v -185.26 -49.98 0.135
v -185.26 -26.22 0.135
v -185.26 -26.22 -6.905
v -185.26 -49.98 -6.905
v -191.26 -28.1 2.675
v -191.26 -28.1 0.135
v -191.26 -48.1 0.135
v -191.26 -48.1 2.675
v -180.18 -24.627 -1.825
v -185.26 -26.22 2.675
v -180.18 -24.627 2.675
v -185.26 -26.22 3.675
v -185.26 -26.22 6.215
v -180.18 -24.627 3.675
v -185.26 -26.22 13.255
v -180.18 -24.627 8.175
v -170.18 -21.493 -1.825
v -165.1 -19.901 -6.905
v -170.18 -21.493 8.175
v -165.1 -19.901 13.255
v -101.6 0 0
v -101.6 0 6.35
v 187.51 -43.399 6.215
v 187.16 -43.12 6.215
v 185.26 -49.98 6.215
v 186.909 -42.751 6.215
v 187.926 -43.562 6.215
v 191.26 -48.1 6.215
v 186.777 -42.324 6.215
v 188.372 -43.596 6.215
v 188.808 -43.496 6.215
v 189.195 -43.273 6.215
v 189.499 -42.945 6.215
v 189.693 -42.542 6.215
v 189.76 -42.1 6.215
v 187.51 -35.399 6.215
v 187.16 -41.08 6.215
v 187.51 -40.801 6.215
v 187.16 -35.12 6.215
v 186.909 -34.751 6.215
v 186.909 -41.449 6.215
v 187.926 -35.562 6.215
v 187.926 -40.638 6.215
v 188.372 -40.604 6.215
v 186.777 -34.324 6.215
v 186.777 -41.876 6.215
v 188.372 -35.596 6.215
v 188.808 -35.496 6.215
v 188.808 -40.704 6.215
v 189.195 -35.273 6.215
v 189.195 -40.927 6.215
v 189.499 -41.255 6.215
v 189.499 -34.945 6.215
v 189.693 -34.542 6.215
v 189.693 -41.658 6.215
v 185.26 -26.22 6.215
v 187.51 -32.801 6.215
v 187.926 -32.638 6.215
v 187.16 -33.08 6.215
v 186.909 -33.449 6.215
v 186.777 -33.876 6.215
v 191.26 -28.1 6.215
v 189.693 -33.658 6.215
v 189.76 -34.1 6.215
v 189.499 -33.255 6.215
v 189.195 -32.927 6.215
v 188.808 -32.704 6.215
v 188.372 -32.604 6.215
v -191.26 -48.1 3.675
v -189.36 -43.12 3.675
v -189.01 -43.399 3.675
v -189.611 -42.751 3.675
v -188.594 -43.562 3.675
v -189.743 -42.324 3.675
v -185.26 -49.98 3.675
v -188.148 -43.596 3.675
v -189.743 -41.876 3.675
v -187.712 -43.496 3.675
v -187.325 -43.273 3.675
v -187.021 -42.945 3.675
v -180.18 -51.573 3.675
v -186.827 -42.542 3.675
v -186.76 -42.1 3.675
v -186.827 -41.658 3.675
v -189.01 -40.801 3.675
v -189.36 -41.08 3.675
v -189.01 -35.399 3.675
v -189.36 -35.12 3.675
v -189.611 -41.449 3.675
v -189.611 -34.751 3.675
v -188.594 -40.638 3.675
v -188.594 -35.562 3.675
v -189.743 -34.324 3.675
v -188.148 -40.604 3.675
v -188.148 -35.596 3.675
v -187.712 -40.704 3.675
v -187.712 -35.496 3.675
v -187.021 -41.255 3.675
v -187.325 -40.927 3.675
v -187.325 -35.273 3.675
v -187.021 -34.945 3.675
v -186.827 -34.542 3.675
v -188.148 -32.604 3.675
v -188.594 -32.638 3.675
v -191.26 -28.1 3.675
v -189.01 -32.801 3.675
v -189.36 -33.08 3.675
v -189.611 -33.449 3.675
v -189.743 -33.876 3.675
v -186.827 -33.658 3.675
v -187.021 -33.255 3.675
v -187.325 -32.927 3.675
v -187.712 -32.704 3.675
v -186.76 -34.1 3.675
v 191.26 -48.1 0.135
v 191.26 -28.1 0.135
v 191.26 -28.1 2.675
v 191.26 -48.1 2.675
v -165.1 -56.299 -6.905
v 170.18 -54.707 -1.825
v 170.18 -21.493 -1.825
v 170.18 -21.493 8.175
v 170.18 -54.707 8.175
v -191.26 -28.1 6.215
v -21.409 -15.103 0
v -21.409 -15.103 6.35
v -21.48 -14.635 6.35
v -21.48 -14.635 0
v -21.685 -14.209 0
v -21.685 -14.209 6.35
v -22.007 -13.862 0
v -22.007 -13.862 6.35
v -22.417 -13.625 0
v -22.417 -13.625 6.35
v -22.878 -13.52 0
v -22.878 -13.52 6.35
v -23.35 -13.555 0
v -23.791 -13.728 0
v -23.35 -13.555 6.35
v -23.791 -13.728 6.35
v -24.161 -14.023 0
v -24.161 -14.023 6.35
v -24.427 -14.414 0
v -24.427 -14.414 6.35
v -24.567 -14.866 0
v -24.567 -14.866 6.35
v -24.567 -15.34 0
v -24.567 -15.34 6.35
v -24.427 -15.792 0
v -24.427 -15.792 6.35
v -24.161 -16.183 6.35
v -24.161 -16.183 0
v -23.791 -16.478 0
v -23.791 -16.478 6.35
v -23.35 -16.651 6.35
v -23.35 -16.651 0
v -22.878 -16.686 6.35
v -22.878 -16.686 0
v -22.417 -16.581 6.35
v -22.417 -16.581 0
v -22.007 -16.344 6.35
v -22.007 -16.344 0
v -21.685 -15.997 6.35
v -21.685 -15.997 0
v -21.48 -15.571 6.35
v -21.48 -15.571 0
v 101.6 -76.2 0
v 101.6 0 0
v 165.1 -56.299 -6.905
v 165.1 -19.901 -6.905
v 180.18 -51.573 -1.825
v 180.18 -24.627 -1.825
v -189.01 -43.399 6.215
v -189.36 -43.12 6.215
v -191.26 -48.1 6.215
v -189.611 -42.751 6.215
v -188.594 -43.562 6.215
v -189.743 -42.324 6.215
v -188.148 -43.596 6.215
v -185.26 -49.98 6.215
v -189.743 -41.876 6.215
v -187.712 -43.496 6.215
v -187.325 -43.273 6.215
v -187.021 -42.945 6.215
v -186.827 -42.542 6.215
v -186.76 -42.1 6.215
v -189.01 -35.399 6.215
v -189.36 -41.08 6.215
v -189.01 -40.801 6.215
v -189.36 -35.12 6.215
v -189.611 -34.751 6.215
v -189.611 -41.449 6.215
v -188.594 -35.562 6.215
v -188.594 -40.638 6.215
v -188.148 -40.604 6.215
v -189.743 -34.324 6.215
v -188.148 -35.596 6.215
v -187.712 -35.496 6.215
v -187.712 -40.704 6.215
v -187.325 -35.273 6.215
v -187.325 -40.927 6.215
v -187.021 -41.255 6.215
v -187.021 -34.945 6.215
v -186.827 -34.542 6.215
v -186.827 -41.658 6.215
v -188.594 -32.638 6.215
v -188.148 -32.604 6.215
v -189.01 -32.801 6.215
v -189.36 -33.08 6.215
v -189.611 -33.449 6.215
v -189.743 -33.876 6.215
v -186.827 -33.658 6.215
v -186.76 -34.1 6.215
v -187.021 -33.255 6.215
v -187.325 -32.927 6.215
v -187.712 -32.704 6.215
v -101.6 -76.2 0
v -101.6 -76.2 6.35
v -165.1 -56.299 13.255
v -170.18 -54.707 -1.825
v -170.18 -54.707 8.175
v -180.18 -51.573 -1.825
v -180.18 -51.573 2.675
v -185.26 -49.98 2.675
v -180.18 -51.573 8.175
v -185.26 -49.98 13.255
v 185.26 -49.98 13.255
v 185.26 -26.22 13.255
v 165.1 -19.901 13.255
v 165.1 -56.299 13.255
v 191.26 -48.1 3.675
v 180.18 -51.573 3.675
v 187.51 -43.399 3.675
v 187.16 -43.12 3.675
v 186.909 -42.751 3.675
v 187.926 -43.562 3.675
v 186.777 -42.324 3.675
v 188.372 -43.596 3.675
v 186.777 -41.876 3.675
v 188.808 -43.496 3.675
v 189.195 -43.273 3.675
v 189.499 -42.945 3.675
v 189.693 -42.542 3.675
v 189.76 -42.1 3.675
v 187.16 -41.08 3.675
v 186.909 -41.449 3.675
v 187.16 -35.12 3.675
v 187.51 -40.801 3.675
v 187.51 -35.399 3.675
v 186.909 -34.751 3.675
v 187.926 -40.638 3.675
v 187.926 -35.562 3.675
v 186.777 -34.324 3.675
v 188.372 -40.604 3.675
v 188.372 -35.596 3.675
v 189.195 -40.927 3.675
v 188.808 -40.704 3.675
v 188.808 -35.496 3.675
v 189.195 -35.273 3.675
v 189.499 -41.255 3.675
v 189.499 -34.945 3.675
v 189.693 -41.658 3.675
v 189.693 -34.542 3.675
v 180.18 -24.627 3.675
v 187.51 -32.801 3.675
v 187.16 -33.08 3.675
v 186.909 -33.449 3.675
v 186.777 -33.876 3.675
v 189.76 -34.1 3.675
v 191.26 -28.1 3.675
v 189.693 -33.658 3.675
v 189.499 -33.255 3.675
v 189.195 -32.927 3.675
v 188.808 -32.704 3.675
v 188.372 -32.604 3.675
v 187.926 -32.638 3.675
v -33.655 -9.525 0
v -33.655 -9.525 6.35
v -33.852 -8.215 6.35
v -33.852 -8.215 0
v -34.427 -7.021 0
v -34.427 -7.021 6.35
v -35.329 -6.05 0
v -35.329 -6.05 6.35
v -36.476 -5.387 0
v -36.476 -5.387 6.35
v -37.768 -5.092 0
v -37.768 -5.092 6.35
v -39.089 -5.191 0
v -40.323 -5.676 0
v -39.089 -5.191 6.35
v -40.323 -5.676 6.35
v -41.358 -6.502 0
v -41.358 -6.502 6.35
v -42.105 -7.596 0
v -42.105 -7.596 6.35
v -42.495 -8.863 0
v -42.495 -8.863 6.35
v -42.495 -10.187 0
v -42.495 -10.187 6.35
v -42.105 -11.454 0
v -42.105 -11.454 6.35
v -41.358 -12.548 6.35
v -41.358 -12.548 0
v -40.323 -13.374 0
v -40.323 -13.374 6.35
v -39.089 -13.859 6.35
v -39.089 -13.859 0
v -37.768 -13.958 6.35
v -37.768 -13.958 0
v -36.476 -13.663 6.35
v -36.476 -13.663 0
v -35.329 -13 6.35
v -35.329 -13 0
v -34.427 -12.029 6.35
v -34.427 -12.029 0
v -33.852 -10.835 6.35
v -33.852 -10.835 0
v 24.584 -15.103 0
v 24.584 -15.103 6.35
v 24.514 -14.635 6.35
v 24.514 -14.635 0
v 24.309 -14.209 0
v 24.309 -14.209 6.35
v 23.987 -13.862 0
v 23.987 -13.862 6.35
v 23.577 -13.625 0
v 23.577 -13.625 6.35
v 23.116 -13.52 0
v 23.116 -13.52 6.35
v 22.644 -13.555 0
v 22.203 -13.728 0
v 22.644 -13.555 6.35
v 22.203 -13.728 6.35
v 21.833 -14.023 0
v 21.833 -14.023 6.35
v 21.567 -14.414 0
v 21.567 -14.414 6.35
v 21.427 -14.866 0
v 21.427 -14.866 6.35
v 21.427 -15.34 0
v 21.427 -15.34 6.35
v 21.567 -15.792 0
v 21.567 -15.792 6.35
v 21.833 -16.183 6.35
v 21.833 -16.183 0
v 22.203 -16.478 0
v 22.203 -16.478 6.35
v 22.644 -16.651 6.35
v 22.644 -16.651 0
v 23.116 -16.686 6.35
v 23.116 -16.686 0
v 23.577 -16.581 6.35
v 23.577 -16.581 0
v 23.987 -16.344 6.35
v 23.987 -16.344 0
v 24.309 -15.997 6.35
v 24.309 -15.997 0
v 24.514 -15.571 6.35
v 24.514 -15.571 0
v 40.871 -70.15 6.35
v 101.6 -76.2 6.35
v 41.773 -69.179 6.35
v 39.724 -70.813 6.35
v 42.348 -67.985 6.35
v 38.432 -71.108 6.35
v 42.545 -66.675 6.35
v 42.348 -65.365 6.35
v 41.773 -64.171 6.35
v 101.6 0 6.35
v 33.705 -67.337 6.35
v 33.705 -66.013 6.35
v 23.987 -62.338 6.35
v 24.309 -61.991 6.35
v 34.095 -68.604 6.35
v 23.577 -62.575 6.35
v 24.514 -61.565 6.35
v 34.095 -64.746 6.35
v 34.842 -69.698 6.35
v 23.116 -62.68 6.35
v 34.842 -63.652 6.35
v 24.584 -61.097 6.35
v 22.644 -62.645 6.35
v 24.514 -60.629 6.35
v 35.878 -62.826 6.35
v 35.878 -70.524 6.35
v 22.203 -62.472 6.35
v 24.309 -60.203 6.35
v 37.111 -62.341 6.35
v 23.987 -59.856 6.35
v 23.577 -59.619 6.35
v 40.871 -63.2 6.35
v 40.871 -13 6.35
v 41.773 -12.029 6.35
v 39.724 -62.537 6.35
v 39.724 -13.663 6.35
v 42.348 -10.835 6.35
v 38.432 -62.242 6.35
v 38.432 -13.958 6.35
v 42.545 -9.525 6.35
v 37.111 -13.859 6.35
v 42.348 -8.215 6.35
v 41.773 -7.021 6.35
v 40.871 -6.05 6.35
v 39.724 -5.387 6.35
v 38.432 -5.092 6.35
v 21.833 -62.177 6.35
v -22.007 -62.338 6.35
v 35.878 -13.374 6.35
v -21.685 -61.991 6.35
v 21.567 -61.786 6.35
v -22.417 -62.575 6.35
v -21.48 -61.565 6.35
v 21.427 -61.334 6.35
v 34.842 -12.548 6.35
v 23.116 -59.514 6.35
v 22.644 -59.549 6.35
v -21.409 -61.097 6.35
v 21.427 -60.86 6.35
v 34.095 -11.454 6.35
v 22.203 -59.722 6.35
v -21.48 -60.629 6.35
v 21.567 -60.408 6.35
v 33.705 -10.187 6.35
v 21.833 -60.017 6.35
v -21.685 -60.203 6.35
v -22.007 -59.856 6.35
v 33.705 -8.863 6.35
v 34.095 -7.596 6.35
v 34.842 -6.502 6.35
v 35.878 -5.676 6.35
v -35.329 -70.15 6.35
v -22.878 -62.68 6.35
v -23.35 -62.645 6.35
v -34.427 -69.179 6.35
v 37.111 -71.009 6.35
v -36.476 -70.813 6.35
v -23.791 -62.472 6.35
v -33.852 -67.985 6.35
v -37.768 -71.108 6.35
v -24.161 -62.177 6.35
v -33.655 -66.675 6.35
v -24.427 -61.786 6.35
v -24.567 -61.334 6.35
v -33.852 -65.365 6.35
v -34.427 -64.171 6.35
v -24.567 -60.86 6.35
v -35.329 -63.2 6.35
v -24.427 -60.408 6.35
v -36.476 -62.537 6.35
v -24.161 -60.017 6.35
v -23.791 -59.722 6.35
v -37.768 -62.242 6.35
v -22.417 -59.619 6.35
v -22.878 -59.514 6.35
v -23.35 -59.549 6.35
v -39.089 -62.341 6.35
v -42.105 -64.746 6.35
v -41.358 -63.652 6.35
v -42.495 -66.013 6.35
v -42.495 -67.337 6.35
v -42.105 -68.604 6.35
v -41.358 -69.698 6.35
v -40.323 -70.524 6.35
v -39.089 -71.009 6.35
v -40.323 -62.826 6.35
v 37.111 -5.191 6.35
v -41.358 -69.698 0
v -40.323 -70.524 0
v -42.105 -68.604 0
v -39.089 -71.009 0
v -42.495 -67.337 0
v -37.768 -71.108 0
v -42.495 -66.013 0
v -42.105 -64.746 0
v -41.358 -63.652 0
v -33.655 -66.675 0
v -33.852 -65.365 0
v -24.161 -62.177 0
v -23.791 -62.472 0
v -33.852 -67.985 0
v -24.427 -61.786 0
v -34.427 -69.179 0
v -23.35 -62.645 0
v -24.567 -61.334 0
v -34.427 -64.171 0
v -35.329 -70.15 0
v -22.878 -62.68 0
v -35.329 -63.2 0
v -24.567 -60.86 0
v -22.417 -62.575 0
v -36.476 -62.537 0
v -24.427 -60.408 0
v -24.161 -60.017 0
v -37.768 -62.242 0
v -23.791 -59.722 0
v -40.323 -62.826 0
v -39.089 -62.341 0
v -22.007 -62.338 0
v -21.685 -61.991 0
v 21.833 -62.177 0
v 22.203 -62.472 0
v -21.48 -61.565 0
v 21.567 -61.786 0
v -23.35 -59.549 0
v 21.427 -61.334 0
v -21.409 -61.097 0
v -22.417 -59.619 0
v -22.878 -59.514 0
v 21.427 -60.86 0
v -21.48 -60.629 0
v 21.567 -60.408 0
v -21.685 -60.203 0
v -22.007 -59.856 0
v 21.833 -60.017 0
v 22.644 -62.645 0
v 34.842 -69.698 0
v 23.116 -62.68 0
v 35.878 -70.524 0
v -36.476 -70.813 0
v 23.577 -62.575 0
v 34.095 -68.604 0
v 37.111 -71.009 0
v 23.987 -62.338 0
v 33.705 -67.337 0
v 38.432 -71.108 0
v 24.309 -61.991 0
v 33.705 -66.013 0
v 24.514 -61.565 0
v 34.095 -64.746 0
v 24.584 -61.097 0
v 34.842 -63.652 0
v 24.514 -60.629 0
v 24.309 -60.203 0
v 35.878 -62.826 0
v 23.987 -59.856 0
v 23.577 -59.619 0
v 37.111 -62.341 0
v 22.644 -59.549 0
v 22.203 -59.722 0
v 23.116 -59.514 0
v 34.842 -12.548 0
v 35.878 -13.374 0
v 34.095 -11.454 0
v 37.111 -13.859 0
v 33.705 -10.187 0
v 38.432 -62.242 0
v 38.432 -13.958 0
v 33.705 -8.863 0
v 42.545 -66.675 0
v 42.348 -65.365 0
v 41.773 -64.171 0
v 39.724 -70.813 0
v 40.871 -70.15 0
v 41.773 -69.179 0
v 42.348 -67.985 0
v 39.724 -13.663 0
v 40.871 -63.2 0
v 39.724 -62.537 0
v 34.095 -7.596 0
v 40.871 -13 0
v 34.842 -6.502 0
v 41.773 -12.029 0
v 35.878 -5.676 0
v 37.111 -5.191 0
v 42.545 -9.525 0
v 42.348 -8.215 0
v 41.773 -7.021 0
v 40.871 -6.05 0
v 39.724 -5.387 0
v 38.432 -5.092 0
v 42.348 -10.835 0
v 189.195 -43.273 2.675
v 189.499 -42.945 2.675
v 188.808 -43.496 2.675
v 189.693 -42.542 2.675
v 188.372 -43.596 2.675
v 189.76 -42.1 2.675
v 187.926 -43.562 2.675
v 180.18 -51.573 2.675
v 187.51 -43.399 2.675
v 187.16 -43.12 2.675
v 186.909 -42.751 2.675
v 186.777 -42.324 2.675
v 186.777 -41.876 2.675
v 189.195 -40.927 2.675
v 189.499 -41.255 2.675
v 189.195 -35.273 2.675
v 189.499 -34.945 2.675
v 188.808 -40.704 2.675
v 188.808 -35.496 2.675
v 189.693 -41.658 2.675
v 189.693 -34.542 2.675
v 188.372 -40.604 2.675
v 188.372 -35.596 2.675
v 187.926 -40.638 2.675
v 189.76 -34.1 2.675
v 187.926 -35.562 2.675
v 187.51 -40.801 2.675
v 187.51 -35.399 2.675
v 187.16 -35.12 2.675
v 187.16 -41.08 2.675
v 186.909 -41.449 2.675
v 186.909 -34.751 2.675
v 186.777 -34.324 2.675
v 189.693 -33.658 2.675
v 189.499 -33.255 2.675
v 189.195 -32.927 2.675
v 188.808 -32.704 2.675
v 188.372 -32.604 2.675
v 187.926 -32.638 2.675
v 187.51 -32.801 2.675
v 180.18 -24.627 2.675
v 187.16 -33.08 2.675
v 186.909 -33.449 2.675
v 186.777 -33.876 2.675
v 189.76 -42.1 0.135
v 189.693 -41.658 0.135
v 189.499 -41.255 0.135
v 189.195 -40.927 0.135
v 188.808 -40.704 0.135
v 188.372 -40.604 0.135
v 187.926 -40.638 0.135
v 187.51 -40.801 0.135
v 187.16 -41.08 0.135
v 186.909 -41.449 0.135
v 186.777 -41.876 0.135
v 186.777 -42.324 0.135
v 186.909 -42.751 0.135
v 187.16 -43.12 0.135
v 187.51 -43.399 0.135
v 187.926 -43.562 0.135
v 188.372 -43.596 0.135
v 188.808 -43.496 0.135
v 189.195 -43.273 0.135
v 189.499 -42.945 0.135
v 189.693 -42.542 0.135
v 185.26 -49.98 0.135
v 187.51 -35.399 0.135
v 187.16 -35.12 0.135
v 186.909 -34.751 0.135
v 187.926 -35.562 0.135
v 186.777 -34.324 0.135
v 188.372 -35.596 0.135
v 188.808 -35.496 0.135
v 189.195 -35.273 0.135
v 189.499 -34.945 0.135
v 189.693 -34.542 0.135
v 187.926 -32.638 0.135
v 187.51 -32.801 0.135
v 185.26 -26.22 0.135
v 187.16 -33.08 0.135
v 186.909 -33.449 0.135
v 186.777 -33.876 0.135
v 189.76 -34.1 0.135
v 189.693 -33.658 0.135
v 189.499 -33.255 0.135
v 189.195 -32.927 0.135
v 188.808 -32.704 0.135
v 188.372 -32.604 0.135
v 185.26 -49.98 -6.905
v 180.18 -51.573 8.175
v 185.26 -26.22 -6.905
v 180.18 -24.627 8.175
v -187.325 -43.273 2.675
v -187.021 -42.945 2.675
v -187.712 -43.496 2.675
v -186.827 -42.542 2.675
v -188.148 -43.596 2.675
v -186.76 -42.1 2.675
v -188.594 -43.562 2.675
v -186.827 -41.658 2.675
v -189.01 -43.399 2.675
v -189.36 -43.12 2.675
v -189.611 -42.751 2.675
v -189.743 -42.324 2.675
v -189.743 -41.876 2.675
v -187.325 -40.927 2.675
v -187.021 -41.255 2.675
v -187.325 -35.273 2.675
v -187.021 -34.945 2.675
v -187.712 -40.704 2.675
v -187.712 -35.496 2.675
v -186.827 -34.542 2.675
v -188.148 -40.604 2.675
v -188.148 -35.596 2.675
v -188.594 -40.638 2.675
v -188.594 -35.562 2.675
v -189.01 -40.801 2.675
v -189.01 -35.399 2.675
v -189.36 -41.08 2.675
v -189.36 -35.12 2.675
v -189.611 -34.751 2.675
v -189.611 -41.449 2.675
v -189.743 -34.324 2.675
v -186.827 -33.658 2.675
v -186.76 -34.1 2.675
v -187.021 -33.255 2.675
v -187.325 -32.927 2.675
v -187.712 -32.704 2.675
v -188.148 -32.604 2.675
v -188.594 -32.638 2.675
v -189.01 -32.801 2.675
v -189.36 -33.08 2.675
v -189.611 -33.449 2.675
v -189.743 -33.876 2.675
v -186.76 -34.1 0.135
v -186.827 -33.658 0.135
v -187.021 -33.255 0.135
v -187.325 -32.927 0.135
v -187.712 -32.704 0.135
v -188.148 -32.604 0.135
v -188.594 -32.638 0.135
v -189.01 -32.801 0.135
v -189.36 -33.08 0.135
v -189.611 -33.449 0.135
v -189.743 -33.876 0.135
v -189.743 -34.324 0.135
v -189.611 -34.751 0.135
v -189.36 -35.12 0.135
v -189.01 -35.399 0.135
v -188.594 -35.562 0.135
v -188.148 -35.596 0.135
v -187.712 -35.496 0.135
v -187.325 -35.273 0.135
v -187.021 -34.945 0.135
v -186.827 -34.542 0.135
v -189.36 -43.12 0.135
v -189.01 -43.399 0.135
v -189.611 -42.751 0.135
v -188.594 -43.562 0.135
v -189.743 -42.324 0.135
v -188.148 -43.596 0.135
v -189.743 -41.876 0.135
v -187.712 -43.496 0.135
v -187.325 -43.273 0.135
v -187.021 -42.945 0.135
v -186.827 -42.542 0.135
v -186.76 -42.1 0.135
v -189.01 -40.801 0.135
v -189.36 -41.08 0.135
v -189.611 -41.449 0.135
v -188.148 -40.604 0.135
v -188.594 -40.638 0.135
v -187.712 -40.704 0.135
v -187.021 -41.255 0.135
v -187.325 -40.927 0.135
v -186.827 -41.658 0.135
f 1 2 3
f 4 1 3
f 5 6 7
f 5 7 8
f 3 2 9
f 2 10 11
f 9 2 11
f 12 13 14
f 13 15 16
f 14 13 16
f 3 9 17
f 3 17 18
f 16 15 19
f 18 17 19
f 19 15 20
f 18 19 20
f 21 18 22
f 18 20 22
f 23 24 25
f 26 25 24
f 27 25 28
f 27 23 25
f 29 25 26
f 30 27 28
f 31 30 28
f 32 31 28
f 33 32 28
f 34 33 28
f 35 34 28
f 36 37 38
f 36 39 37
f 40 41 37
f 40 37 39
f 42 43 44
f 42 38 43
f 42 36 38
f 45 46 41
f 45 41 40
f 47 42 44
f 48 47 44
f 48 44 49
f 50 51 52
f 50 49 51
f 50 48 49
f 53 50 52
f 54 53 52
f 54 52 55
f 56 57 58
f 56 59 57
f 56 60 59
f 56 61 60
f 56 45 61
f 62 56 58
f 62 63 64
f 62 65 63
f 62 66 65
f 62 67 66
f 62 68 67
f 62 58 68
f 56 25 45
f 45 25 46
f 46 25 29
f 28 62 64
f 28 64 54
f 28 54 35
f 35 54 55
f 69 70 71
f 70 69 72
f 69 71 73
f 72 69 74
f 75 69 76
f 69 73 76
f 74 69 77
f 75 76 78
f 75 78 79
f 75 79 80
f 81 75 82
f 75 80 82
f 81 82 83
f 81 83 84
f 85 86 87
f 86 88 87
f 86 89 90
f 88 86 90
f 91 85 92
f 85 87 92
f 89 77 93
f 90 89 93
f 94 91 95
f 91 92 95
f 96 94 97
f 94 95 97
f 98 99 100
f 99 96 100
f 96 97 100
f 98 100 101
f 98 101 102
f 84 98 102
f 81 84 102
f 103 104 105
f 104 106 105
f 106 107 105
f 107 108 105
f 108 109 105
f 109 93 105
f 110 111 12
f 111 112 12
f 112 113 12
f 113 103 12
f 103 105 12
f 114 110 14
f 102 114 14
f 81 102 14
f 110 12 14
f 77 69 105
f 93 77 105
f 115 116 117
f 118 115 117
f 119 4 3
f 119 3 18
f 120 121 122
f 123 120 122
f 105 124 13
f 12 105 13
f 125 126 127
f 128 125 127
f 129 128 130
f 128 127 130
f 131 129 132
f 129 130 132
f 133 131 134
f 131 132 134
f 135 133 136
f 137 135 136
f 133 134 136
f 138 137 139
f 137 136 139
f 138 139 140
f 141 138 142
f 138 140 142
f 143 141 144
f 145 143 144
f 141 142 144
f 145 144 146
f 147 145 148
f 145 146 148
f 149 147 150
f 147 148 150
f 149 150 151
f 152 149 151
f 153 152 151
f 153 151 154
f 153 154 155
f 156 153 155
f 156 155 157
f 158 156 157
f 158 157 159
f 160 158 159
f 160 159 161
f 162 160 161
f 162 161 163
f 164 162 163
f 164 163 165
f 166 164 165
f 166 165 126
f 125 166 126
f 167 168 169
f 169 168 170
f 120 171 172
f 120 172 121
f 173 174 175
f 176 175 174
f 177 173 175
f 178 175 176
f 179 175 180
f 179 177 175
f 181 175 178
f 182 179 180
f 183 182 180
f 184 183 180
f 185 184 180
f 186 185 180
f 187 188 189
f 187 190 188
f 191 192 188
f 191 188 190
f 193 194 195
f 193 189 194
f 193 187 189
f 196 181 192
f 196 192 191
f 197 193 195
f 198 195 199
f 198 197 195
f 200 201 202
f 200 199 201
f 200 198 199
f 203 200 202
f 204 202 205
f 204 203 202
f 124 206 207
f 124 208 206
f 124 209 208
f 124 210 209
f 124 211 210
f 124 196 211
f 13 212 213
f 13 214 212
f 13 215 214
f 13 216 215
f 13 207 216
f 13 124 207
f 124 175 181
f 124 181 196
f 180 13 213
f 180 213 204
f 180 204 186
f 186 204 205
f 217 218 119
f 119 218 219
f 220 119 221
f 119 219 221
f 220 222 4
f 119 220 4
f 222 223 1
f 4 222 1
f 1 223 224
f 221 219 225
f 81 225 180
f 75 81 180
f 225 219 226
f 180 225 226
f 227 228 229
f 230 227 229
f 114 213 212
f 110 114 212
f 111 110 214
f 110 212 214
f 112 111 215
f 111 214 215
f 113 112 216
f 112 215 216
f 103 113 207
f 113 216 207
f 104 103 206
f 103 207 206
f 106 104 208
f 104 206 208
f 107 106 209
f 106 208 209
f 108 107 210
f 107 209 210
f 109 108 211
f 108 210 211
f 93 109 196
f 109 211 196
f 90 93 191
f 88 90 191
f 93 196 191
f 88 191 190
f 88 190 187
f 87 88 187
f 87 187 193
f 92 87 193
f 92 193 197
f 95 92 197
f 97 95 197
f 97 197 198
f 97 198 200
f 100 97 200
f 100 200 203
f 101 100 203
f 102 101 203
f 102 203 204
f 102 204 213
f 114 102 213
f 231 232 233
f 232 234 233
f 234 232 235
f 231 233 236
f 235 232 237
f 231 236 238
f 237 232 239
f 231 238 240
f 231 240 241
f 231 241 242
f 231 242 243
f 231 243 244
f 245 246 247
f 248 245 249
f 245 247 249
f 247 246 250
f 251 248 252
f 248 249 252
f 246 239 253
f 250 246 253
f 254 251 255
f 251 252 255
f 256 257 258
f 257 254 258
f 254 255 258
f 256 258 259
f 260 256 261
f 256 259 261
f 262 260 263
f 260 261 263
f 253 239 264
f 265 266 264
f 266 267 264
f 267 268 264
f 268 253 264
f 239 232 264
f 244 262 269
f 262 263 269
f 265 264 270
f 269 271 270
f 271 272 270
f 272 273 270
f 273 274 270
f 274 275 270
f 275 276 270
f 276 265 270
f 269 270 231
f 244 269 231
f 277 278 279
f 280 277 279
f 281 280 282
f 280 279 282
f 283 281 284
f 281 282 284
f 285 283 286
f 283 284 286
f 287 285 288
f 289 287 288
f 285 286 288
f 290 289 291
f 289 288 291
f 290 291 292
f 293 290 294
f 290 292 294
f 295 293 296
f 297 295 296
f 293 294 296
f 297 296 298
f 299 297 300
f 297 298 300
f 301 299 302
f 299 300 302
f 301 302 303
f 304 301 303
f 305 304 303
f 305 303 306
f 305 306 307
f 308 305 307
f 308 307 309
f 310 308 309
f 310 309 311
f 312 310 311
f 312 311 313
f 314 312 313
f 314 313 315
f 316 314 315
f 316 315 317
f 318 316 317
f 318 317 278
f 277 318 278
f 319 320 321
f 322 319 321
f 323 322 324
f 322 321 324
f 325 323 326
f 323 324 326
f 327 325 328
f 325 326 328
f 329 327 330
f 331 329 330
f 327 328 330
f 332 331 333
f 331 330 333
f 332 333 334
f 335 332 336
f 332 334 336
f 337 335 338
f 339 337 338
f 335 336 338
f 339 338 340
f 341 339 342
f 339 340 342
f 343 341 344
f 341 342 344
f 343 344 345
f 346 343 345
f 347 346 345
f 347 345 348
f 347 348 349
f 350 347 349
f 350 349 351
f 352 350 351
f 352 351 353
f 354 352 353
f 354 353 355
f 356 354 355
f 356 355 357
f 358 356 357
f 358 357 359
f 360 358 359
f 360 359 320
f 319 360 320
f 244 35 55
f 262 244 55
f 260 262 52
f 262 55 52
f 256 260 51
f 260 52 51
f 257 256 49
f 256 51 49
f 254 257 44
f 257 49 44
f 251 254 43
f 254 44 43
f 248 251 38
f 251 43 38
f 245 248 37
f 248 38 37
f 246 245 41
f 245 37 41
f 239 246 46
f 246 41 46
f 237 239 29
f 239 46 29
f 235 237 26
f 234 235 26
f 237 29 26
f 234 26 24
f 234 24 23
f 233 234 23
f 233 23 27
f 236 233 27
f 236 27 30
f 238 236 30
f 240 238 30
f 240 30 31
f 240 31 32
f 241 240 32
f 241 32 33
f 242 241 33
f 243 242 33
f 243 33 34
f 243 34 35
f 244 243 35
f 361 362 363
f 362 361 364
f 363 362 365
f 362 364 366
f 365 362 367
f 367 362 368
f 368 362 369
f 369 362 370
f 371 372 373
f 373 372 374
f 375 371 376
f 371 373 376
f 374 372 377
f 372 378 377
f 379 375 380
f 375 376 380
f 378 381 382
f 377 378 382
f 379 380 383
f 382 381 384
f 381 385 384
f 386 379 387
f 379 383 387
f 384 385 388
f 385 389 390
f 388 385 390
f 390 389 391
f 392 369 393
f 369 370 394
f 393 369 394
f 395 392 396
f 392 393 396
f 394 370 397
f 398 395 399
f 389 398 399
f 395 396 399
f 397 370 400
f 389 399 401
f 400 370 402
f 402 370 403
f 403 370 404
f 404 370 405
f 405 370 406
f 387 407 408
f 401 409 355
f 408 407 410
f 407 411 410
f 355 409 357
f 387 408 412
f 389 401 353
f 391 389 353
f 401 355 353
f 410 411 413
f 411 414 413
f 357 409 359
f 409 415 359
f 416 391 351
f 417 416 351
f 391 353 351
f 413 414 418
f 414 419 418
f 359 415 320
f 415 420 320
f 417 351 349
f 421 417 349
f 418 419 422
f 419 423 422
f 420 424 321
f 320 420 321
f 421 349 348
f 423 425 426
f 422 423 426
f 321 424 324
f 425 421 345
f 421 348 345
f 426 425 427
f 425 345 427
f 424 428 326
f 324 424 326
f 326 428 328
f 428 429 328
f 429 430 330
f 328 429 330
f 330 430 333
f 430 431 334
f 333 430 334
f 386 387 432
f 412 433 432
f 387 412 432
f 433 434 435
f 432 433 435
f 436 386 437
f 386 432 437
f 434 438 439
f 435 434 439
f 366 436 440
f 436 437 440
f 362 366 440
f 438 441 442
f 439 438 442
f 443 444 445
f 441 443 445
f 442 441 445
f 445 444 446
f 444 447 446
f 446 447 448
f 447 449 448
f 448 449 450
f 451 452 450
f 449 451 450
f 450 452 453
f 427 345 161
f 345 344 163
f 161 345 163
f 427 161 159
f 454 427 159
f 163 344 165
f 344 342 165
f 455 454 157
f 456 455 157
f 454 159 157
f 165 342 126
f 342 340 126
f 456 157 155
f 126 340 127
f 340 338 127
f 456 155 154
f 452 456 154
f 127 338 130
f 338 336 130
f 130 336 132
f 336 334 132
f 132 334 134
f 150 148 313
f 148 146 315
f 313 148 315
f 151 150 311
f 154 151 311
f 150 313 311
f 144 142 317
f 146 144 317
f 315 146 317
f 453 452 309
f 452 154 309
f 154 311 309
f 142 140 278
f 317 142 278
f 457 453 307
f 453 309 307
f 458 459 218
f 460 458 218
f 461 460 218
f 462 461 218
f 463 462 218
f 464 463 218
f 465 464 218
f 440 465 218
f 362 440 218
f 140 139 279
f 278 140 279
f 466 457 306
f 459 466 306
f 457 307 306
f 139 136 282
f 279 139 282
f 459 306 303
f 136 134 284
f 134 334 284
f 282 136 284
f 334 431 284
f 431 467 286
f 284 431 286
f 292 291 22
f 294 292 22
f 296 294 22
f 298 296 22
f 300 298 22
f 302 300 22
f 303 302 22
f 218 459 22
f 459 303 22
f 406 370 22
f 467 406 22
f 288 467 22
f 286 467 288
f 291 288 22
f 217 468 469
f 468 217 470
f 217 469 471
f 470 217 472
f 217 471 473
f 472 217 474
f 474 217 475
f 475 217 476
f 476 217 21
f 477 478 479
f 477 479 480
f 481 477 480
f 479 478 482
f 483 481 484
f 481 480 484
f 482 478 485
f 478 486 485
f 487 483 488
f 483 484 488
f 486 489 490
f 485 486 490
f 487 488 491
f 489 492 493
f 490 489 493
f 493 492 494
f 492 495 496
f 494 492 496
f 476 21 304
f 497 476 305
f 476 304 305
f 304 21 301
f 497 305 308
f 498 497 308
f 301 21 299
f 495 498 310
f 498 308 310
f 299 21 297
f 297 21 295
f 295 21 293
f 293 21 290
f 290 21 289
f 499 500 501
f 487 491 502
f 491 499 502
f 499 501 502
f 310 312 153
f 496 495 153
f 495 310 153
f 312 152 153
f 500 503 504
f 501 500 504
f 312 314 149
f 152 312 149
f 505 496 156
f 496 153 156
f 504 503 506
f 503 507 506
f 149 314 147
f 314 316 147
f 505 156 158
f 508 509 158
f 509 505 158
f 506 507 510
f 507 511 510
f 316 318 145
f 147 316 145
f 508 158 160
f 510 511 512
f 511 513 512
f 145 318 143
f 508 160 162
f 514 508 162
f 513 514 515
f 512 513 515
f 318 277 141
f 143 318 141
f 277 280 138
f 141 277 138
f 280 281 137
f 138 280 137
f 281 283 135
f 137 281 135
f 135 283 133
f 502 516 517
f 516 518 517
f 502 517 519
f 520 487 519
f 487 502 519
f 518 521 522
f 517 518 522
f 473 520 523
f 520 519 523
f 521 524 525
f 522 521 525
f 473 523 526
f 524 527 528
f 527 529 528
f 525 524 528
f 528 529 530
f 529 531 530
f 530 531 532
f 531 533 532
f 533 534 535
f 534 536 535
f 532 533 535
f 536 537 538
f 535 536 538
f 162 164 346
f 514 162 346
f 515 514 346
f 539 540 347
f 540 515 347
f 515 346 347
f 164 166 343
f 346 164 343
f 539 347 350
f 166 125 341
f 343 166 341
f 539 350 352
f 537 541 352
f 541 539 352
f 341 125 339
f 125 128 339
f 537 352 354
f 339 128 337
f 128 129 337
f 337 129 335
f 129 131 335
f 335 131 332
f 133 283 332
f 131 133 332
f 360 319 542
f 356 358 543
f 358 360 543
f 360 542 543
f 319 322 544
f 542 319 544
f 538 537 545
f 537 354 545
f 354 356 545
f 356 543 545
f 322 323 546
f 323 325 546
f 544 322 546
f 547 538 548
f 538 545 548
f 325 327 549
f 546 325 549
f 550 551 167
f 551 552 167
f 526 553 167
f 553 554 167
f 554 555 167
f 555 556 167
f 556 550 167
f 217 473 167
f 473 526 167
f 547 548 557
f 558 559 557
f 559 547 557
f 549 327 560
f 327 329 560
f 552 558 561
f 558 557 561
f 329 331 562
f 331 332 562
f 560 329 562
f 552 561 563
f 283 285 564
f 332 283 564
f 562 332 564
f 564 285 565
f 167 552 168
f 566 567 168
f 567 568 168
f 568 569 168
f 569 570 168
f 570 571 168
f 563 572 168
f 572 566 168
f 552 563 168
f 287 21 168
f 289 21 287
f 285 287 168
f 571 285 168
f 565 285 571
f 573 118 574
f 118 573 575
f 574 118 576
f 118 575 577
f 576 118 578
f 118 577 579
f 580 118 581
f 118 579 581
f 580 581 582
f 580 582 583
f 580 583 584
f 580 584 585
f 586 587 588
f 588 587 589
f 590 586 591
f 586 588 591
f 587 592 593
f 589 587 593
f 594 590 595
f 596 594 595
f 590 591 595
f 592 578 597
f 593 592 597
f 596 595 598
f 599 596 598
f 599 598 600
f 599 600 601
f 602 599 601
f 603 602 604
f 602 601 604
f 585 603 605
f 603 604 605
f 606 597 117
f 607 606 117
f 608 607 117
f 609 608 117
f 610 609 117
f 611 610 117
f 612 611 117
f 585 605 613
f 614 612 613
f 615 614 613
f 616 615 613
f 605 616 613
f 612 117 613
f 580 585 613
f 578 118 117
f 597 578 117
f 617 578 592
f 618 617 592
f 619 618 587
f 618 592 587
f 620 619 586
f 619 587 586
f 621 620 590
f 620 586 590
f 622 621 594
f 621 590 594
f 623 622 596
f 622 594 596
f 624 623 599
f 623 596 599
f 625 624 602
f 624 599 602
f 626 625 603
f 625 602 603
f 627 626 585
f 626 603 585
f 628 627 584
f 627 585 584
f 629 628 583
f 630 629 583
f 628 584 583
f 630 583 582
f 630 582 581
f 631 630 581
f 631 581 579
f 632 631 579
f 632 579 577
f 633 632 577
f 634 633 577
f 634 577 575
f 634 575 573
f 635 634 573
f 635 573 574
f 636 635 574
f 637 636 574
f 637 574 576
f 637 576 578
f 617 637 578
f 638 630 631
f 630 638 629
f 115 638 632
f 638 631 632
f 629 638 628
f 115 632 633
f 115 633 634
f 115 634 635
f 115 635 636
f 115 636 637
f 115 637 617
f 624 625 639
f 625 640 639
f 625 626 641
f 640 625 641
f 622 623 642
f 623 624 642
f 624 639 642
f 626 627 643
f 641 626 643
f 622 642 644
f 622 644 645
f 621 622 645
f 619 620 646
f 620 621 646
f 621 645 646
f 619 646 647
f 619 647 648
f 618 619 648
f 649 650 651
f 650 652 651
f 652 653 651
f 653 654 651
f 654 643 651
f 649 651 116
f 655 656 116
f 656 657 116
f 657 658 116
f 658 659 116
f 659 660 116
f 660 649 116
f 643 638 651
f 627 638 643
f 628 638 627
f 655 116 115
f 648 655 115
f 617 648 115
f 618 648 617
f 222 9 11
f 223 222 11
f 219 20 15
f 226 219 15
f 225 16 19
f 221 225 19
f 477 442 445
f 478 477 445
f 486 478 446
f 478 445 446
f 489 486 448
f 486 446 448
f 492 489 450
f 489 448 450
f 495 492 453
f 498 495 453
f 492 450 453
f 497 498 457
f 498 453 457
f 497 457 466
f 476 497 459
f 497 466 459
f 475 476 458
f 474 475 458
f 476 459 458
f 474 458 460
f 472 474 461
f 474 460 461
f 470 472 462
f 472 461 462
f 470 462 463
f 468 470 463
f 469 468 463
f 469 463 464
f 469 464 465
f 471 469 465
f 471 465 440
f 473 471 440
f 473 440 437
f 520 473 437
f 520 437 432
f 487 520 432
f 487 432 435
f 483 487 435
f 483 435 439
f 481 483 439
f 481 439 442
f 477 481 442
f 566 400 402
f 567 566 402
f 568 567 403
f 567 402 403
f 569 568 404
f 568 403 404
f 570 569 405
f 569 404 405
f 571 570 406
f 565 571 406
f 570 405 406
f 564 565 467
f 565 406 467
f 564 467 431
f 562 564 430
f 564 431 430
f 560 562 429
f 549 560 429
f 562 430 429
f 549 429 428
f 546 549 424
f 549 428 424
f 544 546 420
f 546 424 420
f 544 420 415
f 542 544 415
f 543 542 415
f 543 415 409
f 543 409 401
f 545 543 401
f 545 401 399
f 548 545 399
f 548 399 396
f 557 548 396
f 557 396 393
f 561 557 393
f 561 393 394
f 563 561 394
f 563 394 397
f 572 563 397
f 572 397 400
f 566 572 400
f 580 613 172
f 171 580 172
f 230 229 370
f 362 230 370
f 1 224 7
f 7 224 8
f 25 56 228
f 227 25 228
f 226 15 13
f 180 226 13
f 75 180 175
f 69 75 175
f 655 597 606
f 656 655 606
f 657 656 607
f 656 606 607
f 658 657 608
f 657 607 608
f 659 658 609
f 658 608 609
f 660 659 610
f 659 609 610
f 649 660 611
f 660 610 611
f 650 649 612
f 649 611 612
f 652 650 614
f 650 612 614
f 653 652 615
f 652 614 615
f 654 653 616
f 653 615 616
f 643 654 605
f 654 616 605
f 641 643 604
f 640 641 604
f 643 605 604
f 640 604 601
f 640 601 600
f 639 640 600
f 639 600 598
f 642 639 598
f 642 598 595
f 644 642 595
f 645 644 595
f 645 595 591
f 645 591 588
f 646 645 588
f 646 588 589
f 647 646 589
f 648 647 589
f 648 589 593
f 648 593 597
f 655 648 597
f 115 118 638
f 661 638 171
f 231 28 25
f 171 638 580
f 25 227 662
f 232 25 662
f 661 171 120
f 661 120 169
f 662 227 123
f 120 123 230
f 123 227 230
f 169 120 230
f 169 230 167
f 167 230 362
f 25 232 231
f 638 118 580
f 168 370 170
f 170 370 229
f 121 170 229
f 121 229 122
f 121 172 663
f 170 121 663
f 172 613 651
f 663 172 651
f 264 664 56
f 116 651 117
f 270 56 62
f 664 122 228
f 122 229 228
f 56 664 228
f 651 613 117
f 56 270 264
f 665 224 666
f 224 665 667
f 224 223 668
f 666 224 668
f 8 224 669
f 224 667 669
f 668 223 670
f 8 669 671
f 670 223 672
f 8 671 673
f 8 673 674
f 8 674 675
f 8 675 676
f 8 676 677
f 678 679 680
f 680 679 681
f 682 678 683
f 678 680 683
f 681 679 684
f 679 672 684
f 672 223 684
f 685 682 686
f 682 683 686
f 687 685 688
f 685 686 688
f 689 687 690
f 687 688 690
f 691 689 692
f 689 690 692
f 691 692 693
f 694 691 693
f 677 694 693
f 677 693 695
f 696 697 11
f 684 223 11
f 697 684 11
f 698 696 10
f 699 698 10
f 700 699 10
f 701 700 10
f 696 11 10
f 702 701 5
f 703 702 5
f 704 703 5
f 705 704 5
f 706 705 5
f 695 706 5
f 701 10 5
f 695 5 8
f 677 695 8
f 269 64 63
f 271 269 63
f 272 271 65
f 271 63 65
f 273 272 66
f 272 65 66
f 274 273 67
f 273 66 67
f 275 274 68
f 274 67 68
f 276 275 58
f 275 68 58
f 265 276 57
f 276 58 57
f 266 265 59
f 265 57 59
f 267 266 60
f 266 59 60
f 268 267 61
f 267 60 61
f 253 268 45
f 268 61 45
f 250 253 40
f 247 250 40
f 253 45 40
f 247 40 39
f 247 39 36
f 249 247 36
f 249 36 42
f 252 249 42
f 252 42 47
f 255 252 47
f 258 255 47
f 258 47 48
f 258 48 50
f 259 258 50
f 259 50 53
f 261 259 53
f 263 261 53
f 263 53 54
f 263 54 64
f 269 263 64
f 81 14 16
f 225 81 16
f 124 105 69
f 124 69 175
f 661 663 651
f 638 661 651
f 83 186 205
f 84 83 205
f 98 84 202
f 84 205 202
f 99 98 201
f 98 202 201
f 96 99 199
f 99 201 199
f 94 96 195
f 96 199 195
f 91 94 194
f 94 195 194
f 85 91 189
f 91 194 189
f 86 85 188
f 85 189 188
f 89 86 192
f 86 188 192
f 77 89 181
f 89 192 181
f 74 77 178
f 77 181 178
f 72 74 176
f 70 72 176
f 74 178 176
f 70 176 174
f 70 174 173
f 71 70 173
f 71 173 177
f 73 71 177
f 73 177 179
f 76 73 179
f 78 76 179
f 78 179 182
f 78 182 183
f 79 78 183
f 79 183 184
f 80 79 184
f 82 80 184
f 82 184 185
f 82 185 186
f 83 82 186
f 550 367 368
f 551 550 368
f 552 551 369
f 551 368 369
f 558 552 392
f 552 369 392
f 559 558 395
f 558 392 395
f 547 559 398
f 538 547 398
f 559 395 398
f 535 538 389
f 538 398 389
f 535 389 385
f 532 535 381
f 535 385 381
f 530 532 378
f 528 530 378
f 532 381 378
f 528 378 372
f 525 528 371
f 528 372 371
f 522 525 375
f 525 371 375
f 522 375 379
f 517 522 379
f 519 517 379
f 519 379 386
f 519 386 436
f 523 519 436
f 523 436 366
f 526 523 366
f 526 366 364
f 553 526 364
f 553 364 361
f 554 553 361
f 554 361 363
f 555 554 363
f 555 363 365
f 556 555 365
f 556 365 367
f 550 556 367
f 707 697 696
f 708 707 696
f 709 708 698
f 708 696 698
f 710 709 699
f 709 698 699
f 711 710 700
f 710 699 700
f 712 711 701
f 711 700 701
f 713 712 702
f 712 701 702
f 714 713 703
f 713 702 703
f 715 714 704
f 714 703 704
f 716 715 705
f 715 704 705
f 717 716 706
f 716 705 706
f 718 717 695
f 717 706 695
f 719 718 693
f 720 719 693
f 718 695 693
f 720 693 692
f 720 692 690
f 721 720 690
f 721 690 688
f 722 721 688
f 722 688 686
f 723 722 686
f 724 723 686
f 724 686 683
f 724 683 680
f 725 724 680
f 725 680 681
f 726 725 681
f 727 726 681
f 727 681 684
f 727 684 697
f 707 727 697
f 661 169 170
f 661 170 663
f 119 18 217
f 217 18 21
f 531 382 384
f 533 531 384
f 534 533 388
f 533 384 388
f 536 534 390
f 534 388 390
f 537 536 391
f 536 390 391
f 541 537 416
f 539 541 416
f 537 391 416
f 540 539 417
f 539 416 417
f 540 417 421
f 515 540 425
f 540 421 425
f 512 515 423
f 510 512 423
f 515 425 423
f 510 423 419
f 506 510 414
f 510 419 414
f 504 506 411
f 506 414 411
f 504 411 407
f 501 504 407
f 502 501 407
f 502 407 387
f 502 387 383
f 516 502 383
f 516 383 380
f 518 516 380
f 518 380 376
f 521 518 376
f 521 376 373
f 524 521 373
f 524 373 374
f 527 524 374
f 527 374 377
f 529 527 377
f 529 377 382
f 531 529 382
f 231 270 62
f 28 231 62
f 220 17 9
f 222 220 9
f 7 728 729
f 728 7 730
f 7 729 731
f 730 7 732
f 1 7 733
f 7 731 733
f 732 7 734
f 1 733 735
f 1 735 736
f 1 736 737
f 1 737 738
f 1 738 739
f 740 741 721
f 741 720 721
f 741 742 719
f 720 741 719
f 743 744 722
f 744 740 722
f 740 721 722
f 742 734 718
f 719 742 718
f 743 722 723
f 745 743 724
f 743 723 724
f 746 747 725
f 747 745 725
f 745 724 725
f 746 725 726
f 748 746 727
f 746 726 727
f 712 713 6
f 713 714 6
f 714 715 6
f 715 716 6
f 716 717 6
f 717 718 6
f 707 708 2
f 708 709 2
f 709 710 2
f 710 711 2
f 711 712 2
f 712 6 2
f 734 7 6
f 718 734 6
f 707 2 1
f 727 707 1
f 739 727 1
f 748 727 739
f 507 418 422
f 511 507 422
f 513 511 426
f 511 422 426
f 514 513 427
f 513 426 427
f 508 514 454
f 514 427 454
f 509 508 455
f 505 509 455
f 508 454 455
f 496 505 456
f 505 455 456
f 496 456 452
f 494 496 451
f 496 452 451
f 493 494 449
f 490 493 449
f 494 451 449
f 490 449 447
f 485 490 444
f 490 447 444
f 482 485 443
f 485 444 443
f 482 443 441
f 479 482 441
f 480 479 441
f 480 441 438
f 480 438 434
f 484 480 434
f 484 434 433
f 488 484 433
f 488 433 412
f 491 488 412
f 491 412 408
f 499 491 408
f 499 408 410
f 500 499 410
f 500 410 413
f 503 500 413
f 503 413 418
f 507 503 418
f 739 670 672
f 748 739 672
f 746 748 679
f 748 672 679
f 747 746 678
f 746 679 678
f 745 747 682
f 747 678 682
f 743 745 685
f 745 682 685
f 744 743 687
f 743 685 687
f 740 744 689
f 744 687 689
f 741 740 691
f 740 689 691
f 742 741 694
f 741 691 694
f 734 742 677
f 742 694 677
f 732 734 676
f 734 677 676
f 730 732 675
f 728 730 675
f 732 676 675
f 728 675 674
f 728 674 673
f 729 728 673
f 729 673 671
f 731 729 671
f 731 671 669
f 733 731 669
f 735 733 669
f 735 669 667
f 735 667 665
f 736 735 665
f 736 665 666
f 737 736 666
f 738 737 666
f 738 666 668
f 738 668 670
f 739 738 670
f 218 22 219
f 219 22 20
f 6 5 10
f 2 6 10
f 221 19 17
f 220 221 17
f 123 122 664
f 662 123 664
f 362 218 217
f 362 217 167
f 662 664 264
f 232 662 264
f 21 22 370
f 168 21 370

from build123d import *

# Parameters (mm, degrees)
F0_W     = 6
F0_H     = 2.54
F0_W_2   = 63.5
F0_H_2   = 6.35
F0_W_3   = 101.6
F1_DEPTH = 76.2
F2_R     = 4.445
F2_R_2   = 1.5875
F3_DEPTH = 25.4
F4_R     = 1.5
F5_DEPTH = 13.121
F7_DEPTH = 20.161


with BuildPart() as f1:
    # F0 (on Front) → F1 (new body)
    with BuildSketch(Plane.XZ):
        Polygon((-180.18, 3.675), (-180.18, 8.175), (-170.18, 8.175), (-170.18, -1.825), (-180.18, -1.825), (-180.18, 2.675), (-185.26, 2.675), (-185.26, 0.135), (-185.26, -6.905), (-165.1, -6.905), (-165.1, 0), (-165.1, 6.35), (-165.1, 13.255), (-185.26, 13.255), (-185.26, 6.215), (-185.26, 3.675), align=None)
        with Locations((-188.26, 4.945)):
            Rectangle(F0_W, F0_H)
        with Locations((-188.26, 1.405)):
            Rectangle(F0_W, F0_H)
        Polygon((-101.6, 6.35), (-165.1, 13.255), (-165.1, 6.35), align=None)
        with Locations((-133.35, 3.175)):
            Rectangle(F0_W_2, F0_H_2)
        with Locations((-50.8, 3.175)):
            Rectangle(F0_W_3, F0_H_2)
        Polygon((-101.6, 0), (-165.1, 0), (-165.1, -6.905), align=None)
        with Locations((50.8, 3.175)):
            Rectangle(F0_W_3, F0_H_2)
        with Locations((133.35, 3.175)):
            Rectangle(F0_W_2, F0_H_2)
        Polygon((165.1, 13.255), (101.6, 6.35), (165.1, 6.35), align=None)
        Polygon((165.1, 0), (101.6, 0), (165.1, -6.905), align=None)
        Polygon((165.1, 13.255), (165.1, 6.35), (165.1, 0), (165.1, -6.905), (185.26, -6.905), (185.26, 0.135), (185.26, 2.675), (180.18, 2.675), (180.18, -1.825), (170.18, -1.825), (170.18, 8.175), (180.18, 8.175), (180.18, 3.675), (185.26, 3.675), (185.26, 6.215), (185.26, 13.255), align=None)
        with Locations((188.26, 4.945)):
            Rectangle(F0_W, F0_H)
        with Locations((188.26, 1.405)):
            Rectangle(F0_W, F0_H)
    extrude(amount=F1_DEPTH)

    # F2 (on face) → F3 (cut)
    with BuildSketch(Plane.XY.offset(6.35)):
        with Locations((-38.1, -9.525)):
            Circle(F2_R)
        with Locations((38.1, -9.525)):
            Circle(F2_R)
        with Locations((38.1, -66.675)):
            Circle(F2_R)
        with Locations((-38.1, -66.675)):
            Circle(F2_R)
        with Locations((-22.9969, -15.1031)):
            Circle(F2_R_2)
        with Locations((22.9969, -61.0969)):
            Circle(F2_R_2)
        with Locations((22.9969, -15.1031)):
            Circle(F2_R_2)
        with Locations((-22.9969, -61.0969)):
            Circle(F2_R_2)
    extrude(amount=-F3_DEPTH, mode=Mode.SUBTRACT)

    # F4 (on face) → F5 (cut, through all)
    with BuildSketch(Plane.XY.offset(6.215)):
        with Locations((-188.26, -34.1)):
            Circle(F4_R)
        with Locations((-188.26, -42.1)):
            Circle(F4_R)
        with Locations((188.26, -42.1)):
            Circle(F4_R)
        with Locations((188.26, -34.1)):
            Circle(F4_R)
    extrude(amount=-F5_DEPTH, mode=Mode.SUBTRACT)

    # F6 (on face) → F7 (cut, through all)
    with BuildSketch(Plane.XY.offset(13.255)):
        Polygon((-165.1, -19.9012937765), (-101.6, 0), (-165.1, 0), align=None)
        Polygon((-185.26, -26.2195627928), (-165.1, -19.9012937765), (-165.1, 0), (-185.26, 0), align=None)
        Polygon((-191.26, -28.1), (-185.26, -26.2195627928), (-185.26, 0), (-191.26, 0), align=None)
        Polygon((-185.26, -76.2), (-185.26, -49.9804372072), (-191.26, -48.1), (-191.26, -76.2), align=None)
        Polygon((-165.1, -76.2), (-165.1, -56.2987062235), (-185.26, -49.9804372072), (-185.26, -76.2), align=None)
        Polygon((-101.6, -76.2), (-165.1, -56.2987062235), (-165.1, -76.2), align=None)
        Polygon((191.26, -48.1), (101.6, -76.2), (191.26, -76.2), align=None)
        Polygon((191.26, 0), (101.6, 0), (191.26, -28.1), align=None)
    extrude(amount=-F7_DEPTH, mode=Mode.SUBTRACT)


solid = f1.part
